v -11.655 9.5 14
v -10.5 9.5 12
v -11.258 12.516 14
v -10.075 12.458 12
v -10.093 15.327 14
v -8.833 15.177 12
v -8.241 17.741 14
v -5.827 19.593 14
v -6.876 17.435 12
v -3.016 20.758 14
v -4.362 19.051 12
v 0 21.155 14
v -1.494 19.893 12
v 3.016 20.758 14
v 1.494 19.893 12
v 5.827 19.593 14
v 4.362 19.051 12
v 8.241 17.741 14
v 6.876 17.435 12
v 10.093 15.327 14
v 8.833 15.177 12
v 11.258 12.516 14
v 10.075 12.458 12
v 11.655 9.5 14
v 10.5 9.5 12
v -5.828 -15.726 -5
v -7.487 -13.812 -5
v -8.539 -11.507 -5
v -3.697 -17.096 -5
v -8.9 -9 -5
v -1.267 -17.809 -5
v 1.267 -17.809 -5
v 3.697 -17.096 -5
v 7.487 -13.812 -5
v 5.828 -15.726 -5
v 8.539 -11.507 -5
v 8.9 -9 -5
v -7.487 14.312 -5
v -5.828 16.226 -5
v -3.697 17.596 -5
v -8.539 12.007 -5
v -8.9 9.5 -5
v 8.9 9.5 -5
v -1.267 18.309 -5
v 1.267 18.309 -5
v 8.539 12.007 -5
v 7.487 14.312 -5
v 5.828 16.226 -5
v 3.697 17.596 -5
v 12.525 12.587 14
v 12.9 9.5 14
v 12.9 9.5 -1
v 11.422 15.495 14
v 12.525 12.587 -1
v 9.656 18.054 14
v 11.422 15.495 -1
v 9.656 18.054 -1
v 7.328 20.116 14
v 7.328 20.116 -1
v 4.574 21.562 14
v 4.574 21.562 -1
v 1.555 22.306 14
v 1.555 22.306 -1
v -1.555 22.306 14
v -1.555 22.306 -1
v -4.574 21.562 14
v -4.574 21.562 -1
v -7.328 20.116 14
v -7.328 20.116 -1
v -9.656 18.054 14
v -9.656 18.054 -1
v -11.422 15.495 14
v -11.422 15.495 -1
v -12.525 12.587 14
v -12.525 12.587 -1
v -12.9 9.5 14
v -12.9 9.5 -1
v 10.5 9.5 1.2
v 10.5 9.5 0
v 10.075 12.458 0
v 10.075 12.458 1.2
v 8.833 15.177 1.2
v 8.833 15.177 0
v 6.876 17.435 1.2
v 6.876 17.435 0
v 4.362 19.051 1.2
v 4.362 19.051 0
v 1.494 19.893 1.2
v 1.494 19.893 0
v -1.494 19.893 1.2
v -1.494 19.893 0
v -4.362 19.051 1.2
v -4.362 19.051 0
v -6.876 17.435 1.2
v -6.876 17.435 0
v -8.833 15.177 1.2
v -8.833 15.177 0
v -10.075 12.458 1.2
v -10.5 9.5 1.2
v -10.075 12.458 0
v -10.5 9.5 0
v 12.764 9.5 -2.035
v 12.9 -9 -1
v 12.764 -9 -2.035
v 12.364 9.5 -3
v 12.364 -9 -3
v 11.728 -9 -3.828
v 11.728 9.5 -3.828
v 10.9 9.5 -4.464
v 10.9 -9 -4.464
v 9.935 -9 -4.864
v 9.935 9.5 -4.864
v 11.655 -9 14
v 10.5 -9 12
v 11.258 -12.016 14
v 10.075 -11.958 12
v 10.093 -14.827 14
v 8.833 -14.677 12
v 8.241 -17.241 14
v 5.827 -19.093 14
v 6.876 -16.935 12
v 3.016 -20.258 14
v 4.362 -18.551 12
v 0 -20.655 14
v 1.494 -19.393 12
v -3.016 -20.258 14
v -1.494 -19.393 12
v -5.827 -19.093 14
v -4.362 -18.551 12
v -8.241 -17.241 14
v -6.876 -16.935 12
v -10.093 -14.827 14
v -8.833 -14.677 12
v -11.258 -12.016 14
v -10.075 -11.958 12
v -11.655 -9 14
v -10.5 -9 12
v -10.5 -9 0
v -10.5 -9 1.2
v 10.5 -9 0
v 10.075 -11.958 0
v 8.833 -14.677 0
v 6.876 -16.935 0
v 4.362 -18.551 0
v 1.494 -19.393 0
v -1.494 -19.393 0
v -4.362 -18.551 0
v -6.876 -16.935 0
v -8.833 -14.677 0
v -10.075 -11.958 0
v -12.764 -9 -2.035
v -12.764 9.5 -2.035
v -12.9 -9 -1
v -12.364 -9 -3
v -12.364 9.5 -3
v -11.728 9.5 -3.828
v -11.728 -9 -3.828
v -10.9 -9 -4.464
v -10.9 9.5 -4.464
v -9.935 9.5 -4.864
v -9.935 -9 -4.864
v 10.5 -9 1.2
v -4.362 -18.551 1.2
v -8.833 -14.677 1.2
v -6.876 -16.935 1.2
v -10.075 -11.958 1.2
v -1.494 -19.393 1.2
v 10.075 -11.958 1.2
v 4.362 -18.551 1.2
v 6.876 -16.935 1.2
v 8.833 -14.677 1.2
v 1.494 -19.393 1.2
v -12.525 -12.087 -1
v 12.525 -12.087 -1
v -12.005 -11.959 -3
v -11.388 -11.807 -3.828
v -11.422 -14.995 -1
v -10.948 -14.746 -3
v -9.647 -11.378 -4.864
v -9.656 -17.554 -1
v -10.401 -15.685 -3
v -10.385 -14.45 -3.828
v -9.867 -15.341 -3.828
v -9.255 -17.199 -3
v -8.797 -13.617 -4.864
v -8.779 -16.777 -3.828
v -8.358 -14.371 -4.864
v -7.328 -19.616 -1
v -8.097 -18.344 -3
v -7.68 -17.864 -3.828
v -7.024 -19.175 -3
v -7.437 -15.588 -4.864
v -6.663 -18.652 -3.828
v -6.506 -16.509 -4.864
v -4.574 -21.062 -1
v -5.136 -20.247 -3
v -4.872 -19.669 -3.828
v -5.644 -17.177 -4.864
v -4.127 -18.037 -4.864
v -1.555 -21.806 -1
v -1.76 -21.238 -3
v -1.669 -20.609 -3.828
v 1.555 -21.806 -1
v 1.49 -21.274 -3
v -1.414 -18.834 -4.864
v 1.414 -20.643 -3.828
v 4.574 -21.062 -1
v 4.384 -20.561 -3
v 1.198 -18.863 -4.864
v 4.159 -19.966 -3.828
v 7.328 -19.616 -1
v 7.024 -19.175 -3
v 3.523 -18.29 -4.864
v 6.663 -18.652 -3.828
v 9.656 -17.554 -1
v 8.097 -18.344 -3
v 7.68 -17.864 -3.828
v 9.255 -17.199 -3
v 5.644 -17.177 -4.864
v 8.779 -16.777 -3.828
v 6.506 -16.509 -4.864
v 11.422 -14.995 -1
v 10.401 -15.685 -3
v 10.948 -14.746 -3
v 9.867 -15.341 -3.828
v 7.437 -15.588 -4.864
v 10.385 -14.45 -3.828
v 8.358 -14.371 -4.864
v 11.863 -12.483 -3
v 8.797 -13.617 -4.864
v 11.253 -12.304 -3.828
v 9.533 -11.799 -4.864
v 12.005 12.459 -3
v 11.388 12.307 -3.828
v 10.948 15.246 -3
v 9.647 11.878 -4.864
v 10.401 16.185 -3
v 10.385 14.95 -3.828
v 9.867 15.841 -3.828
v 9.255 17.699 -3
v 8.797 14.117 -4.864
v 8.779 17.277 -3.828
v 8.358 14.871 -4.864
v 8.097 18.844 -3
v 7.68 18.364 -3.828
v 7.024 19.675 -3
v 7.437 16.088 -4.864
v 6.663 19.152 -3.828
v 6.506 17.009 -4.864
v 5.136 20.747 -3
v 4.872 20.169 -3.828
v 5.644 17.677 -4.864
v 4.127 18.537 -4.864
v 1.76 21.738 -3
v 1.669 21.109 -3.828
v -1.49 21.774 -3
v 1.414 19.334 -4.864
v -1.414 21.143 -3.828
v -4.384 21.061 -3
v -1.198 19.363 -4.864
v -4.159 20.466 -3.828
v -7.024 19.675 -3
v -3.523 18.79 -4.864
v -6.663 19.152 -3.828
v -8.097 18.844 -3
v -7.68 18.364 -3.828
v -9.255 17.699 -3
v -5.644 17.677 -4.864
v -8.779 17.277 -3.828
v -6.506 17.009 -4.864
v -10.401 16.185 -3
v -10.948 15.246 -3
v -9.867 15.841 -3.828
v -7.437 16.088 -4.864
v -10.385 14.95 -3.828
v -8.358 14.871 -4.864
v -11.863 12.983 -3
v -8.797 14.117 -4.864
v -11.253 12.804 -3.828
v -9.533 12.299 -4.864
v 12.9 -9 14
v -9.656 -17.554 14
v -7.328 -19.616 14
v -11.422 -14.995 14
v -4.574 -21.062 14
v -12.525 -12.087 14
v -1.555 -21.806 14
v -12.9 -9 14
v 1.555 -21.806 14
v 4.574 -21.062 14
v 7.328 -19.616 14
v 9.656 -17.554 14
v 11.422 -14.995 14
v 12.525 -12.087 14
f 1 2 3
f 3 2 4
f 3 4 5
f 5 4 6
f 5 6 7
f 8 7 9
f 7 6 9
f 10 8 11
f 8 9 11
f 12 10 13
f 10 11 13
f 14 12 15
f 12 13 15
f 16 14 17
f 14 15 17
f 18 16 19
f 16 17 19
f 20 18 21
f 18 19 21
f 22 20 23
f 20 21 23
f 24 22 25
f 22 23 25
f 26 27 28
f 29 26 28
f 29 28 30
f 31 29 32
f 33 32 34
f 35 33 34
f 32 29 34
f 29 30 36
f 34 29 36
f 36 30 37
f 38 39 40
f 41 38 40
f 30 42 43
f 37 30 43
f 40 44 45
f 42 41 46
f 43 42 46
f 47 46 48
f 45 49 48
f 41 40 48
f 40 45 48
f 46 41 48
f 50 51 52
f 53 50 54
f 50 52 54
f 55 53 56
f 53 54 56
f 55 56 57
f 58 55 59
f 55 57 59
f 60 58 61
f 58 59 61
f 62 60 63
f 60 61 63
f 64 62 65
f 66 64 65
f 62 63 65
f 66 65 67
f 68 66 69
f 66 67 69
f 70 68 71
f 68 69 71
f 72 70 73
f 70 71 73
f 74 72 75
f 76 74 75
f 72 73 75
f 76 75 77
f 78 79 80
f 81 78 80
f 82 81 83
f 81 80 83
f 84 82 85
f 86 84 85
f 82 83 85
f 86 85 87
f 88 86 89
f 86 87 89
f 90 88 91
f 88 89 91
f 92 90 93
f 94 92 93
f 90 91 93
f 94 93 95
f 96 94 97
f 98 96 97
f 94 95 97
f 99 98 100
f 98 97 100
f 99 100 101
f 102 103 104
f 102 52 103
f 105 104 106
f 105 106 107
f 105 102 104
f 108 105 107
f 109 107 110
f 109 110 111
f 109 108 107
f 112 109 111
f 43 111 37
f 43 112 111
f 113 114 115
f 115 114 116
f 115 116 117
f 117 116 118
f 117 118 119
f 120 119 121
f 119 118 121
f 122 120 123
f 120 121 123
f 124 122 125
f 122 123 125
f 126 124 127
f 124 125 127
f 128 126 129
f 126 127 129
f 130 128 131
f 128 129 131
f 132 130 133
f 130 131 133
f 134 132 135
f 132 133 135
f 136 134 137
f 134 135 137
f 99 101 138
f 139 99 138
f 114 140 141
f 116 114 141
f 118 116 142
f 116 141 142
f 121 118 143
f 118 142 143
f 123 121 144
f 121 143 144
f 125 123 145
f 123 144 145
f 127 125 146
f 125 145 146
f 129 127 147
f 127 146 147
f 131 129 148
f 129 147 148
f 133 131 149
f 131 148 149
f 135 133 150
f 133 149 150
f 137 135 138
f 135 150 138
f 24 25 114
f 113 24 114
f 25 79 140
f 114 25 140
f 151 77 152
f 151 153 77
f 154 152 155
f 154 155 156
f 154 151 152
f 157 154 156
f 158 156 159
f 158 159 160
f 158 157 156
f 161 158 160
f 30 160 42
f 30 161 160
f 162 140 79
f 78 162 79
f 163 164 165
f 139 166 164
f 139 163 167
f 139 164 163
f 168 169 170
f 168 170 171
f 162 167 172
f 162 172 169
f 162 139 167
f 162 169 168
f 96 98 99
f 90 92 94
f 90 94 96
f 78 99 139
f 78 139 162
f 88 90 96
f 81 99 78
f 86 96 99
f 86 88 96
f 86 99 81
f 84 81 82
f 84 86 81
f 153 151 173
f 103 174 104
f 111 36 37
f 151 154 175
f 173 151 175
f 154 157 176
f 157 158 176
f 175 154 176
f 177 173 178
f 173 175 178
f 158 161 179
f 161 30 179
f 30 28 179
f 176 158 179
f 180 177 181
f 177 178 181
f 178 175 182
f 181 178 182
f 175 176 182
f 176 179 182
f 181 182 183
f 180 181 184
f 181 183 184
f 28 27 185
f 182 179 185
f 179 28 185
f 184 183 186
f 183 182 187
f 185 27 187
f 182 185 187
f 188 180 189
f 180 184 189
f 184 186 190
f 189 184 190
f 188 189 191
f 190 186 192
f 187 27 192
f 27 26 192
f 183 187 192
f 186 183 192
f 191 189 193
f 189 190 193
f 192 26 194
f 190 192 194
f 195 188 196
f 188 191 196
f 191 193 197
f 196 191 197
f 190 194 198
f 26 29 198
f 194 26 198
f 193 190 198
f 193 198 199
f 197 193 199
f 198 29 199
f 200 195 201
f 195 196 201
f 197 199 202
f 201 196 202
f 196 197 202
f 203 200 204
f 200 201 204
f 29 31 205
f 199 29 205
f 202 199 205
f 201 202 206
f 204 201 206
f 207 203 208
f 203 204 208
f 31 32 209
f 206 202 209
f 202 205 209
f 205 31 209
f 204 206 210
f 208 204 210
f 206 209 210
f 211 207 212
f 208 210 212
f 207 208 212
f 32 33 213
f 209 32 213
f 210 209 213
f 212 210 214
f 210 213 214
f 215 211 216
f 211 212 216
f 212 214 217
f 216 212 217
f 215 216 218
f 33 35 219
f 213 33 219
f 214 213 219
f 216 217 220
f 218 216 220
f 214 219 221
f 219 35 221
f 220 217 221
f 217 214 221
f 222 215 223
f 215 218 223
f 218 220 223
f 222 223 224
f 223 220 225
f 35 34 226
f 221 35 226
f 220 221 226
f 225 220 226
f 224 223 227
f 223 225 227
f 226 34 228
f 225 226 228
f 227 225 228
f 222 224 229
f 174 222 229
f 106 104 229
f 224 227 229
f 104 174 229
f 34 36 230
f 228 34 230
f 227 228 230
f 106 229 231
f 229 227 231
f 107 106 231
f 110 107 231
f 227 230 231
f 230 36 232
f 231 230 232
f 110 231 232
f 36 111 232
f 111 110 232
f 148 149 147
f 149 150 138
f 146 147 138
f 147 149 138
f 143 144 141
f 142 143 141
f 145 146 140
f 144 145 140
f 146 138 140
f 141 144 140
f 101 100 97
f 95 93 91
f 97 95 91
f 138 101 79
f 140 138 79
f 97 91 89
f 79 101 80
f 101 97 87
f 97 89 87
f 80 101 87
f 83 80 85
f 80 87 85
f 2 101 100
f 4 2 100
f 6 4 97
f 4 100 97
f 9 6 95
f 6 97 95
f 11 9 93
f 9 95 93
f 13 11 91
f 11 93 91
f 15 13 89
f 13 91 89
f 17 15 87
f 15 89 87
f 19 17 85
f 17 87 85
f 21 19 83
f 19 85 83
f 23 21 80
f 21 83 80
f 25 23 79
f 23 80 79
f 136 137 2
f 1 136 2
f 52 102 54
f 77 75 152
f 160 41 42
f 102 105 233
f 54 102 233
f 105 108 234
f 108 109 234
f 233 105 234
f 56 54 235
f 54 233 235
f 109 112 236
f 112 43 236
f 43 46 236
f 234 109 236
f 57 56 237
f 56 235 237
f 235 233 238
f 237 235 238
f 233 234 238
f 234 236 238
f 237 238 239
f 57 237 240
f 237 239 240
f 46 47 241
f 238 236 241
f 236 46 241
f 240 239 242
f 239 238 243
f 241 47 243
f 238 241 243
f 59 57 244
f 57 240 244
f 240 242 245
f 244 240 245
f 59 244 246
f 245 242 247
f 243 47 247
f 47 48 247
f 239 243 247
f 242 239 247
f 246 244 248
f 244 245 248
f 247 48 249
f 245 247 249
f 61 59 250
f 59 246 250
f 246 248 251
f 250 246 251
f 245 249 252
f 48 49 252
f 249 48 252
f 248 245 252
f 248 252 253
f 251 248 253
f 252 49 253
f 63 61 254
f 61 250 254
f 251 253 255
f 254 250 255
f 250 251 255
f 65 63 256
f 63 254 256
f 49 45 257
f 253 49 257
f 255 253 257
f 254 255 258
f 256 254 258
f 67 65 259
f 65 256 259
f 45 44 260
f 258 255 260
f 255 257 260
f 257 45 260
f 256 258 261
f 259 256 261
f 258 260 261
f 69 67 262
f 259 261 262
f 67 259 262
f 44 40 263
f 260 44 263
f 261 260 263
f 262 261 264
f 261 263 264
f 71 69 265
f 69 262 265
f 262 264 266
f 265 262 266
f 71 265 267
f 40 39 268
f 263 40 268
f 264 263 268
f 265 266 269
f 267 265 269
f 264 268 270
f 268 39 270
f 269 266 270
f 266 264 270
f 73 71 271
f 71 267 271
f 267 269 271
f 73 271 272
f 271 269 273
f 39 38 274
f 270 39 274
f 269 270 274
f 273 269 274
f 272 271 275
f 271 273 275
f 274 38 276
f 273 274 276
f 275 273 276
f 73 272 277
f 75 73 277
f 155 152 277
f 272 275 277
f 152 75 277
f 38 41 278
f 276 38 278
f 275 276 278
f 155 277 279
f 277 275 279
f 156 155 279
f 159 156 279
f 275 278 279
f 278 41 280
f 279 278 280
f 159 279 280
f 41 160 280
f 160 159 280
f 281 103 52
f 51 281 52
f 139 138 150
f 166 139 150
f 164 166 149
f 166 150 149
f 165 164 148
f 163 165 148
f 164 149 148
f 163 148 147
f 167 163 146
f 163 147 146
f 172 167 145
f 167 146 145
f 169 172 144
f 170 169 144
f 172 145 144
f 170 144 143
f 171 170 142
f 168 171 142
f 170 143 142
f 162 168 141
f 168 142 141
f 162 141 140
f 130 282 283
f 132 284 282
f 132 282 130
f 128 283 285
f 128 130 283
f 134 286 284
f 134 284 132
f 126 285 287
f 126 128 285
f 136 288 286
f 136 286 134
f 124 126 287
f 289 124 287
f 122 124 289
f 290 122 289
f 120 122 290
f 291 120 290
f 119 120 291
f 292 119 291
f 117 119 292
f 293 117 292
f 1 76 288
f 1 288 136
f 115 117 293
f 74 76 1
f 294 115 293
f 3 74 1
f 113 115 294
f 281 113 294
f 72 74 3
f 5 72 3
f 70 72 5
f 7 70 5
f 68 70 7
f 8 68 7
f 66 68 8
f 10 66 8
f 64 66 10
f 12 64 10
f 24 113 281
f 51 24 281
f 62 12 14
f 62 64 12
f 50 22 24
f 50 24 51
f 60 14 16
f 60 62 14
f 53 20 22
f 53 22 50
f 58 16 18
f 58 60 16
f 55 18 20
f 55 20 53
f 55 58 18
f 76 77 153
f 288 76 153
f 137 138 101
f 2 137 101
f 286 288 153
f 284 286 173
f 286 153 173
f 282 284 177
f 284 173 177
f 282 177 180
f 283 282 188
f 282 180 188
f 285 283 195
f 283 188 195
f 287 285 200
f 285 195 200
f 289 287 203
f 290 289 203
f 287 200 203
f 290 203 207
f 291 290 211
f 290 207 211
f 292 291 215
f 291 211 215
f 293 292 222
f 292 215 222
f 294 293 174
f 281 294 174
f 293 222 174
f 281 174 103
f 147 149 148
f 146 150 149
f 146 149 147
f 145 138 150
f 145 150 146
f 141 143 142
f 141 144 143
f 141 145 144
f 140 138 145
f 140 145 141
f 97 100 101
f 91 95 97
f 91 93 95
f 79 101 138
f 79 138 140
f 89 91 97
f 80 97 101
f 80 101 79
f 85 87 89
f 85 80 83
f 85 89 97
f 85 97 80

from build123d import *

# Parameters (mm, degrees)
F1_DEPTH = 5
F2_DEPTH = 14
F3_SIZE2 = 2
F3_SIZE  = 1.1547005384
F4_R     = 4
F6_DEPTH = 1.2


with BuildPart() as f1:
    # F0 (on Top) → F1 (new body)
    with BuildSketch(Plane.XY):
        with BuildLine():
            ThreePointArc((12.9, 9.5), (0, 22.4), (-12.9, 9.5))
            Line((-12.9, 9.5), (-12.9, -9))
            ThreePointArc((-12.9, -9), (0, -21.9), (12.9, -9))
            Line((12.9, -9), (12.9, 9.5))
        make_face()
        with BuildLine():
            Line((-10.5, -9), (-10.5, 9.5))
            ThreePointArc((-10.5, 9.5), (0, 20), (10.5, 9.5))
            Line((10.5, 9.5), (10.5, -9))
            ThreePointArc((10.5, -9), (0, -19.5), (-10.5, -9))
        make_face(mode=Mode.SUBTRACT)
        with BuildLine():
            ThreePointArc((10.5, 9.5), (0, 20), (-10.5, 9.5))
            Line((-10.5, 9.5), (-10.5, -9))
            ThreePointArc((-10.5, -9), (0, -19.5), (10.5, -9))
            Line((10.5, -9), (10.5, 9.5))
        make_face()
    extrude(amount=-F1_DEPTH)

    # F0 (on Top) → F2 (join)
    with BuildSketch(Plane.XY):
        with BuildLine():
            ThreePointArc((12.9, 9.5), (0, 22.4), (-12.9, 9.5))
            Line((-12.9, 9.5), (-12.9, -9))
            ThreePointArc((-12.9, -9), (0, -21.9), (12.9, -9))
            Line((12.9, -9), (12.9, 9.5))
        make_face()
        with BuildLine():
            Line((-10.5, -9), (-10.5, 9.5))
            ThreePointArc((-10.5, 9.5), (0, 20), (10.5, 9.5))
            Line((10.5, 9.5), (10.5, -9))
            ThreePointArc((10.5, -9), (0, -19.5), (-10.5, -9))
        make_face(mode=Mode.SUBTRACT)
    extrude(amount=F2_DEPTH)

    # F3
    f3_edges = [f1.edges().sort_by_distance(p)[0] for p in [
        (-10.5, 0.25, 14),
        (0, 20, 14),
        (10.5, 0.25, 14),
        (0, -19.5, 14),
    ]]
    f3_side = f1.faces().sort_by_distance((0, 21.887347, 14))[0]
    chamfer(f3_edges, length=F3_SIZE, length2=F3_SIZE2, reference=f3_side)

    # F4
    f4_edges = [f1.edges().sort_by_distance(p)[0] for p in [
        (0, 22.4, -5),
        (-12.9, 0.25, -5),
        (0, -21.9, -5),
        (12.9, 0.25, -5),
    ]]
    fillet(f4_edges, radius=F4_R)


with BuildPart() as f6:
    # F5 (on face) → F6 (new body)
    with BuildSketch(Plane.XY):
        with BuildLine():
            Line((10.5, -9), (10.5, 9.5))
            ThreePointArc((10.5, 9.5), (0, 20), (-10.5, 9.5))
            Line((-10.5, 9.5), (-10.5, -9))
            ThreePointArc((-10.5, -9), (0, -19.5), (10.5, -9))
        make_face()
    extrude(amount=F6_DEPTH)


solid = Compound([f1.part, f6.part])
